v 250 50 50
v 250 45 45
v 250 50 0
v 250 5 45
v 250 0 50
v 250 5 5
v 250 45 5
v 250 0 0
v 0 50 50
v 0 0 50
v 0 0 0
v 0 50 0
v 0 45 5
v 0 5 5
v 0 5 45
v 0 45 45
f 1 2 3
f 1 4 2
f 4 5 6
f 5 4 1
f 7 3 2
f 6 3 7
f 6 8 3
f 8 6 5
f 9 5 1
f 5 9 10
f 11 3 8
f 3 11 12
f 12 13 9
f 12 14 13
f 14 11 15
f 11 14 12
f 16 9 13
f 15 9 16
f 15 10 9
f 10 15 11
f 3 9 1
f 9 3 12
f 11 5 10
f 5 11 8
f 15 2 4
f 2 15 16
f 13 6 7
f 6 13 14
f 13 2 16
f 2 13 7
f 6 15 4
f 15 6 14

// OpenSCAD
$fn = 32;

// ----------------------------------------------------------------------
// Box beam: 200-250 mm hollow beam
// ----------------------------------------------------------------------

// --- parameters (mm) ---
beam_l = 250;             // beam length, X
beam_w = 50;              // beam width, Y
beam_h = 50;              // beam height, Z
wall = 5;                 // wall thickness

difference() {
  cube([beam_l, beam_w, beam_h]);
  translate([-1, wall, wall])
    cube([beam_l + 2, beam_w - 2 * wall, beam_h - 2 * wall]);
}
